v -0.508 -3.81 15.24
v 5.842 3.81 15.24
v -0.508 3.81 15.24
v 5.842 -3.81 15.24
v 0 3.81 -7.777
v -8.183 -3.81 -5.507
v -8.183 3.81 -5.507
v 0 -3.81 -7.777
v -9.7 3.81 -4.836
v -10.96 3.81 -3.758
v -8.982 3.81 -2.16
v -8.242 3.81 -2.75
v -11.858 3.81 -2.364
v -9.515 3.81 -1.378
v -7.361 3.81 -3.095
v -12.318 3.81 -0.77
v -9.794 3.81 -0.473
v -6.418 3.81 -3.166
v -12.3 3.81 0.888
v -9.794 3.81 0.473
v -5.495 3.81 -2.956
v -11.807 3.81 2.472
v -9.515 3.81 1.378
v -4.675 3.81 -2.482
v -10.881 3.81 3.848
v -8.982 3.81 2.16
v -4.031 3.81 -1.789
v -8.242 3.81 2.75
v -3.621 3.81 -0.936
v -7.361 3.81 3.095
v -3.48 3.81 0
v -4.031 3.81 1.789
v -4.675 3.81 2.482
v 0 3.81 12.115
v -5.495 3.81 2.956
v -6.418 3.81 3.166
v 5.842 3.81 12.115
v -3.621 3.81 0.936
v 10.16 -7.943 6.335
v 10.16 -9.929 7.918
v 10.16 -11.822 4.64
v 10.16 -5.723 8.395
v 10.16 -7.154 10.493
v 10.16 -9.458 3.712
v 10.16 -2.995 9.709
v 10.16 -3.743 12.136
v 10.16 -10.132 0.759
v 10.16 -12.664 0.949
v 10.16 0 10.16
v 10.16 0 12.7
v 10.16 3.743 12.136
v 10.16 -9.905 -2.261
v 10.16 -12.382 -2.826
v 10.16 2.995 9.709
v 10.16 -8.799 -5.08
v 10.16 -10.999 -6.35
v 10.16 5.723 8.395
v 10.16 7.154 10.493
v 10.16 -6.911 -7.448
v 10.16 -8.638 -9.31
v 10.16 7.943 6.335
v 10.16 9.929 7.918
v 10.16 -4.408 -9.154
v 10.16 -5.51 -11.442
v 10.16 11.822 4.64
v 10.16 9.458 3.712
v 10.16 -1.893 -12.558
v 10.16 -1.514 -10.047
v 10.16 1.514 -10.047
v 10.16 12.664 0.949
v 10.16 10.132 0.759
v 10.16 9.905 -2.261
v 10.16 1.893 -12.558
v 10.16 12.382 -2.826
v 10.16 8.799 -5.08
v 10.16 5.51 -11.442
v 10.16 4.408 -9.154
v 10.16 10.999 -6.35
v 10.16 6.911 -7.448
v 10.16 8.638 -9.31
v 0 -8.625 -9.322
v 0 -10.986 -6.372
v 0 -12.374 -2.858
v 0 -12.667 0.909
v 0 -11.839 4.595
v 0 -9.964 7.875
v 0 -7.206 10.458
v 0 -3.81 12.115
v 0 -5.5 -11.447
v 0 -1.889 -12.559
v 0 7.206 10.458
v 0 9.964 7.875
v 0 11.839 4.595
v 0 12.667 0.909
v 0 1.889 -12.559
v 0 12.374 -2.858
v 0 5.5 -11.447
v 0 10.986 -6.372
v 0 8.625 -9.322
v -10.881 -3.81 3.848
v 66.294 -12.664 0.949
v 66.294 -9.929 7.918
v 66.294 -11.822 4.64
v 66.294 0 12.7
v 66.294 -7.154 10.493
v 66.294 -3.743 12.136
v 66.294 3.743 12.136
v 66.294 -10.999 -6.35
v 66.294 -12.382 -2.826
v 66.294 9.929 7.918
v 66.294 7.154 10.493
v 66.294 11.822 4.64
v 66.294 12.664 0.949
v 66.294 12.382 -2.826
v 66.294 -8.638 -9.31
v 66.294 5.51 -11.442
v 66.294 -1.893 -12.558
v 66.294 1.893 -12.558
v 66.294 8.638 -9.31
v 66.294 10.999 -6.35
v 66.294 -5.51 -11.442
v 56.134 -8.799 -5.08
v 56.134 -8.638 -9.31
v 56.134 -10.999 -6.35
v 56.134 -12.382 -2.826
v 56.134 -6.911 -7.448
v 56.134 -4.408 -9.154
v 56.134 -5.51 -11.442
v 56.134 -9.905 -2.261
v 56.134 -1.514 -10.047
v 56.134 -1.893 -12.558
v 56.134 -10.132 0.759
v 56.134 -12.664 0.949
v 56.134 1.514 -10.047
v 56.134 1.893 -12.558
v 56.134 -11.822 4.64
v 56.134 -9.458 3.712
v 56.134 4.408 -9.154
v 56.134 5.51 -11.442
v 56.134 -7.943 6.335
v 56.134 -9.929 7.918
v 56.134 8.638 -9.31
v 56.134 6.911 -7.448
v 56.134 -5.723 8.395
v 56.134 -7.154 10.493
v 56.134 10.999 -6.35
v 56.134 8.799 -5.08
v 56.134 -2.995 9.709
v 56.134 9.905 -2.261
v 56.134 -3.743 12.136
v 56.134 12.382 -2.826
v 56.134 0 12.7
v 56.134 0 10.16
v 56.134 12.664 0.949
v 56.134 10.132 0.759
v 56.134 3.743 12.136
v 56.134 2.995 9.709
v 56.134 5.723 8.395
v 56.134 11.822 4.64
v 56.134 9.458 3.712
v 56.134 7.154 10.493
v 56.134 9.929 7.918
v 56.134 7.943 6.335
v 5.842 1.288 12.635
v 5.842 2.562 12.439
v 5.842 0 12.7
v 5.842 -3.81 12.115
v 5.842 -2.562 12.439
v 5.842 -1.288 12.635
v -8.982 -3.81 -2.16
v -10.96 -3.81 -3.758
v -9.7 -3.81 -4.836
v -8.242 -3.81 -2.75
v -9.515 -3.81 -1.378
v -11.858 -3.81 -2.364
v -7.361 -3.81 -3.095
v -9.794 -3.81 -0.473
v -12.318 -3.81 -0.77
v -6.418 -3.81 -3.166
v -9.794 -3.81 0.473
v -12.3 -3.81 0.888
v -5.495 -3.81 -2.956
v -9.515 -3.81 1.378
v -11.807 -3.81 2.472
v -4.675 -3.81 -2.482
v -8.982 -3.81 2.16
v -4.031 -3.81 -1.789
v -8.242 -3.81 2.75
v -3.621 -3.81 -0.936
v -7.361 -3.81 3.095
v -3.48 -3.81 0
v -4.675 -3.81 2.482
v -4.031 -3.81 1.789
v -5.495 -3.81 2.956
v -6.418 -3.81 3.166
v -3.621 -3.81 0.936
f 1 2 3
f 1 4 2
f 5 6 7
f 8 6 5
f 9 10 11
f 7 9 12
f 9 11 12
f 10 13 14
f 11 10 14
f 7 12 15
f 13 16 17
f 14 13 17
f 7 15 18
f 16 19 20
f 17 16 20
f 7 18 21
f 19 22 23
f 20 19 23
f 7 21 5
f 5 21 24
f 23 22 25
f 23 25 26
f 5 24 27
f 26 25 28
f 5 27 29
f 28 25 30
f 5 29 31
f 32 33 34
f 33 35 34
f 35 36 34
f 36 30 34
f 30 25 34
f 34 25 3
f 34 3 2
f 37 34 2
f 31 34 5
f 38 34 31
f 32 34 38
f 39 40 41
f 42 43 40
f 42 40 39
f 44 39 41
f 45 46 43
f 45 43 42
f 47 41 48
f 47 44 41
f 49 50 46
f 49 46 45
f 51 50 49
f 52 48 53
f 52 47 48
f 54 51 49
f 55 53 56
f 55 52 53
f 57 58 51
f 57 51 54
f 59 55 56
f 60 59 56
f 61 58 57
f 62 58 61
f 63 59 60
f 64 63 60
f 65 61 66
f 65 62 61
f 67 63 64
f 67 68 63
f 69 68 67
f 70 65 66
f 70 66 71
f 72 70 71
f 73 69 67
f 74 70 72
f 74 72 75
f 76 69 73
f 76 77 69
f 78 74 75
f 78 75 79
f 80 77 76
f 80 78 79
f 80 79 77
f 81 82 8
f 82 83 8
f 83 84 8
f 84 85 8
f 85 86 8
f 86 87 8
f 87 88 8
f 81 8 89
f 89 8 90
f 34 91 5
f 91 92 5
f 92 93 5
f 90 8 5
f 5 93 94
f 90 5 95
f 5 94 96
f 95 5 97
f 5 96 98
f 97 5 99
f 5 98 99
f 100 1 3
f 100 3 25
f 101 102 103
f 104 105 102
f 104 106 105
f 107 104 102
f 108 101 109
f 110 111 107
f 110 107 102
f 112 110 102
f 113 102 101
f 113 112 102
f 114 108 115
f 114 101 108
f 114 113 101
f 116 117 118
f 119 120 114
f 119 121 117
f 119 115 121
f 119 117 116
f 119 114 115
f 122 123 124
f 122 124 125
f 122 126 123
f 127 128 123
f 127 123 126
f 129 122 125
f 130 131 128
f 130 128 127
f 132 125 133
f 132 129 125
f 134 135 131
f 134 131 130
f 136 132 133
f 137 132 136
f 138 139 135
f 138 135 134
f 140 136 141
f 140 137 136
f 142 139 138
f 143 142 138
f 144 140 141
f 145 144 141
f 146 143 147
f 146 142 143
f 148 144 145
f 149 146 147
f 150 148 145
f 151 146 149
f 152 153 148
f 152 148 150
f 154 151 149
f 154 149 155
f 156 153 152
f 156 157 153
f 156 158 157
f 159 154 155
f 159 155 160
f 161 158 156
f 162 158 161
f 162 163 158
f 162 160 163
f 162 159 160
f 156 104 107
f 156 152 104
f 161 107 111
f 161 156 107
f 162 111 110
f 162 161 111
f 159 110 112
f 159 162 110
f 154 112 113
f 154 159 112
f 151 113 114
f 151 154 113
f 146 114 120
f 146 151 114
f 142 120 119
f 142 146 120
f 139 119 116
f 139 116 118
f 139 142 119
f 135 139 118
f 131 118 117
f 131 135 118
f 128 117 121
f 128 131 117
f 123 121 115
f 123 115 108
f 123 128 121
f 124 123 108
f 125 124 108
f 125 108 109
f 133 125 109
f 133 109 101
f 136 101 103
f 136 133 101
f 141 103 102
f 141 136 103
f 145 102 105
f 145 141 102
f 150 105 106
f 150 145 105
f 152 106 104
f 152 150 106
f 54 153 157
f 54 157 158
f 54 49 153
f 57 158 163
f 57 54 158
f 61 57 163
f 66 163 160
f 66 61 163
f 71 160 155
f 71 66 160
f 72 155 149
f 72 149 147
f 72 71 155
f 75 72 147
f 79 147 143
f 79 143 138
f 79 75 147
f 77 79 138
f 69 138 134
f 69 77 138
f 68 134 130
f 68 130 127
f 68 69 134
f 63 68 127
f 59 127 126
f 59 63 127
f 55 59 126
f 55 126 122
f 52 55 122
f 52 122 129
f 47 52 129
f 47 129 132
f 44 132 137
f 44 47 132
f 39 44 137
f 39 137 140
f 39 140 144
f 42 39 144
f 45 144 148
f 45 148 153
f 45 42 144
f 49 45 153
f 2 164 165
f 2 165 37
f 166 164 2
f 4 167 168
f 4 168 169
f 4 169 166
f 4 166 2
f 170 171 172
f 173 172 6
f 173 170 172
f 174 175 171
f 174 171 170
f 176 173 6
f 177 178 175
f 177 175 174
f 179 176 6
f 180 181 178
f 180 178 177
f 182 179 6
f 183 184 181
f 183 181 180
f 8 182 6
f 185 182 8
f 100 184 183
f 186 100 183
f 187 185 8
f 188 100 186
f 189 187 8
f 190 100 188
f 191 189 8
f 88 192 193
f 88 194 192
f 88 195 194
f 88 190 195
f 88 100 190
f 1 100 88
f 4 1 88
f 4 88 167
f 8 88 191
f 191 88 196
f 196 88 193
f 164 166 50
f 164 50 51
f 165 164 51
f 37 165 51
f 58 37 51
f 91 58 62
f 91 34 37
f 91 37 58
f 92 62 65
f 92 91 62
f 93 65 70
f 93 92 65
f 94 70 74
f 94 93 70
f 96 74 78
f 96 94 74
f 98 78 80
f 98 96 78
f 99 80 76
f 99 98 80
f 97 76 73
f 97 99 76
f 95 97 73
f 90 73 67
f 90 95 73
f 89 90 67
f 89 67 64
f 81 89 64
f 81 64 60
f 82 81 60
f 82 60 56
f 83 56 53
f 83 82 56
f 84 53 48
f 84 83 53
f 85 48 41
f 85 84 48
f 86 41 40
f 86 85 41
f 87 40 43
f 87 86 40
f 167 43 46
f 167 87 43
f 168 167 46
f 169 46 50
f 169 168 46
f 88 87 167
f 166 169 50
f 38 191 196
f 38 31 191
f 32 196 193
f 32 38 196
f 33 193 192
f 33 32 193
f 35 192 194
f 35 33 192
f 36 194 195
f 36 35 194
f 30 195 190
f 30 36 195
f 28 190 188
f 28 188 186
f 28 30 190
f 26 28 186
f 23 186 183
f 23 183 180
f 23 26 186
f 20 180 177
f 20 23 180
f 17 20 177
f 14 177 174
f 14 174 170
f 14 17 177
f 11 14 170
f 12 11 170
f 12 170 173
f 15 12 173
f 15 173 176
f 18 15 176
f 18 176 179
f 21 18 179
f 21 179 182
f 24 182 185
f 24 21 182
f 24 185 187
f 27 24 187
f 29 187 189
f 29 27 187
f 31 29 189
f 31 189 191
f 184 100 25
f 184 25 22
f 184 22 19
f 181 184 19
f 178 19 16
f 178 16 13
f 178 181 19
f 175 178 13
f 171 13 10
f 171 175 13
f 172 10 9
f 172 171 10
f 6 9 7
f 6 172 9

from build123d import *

# Parameters (mm, degrees)
F0_W     = 5.842
F0_H     = 12.7
F0_R     = 3.175
F2_DEPTH = 3.81


# Not quite as in the source:
# - a feature of the source that left no trace in its solid (it failed there, or was rolled back) is left out


with BuildPart() as f1:
    # F0 (on Front) → F1 (revolve)
    with BuildSketch(Plane.XZ):
        Polygon((5.842, 12.7), (5.842, 0), (66.294, 0), (66.294, 12.7), (56.134, 12.7), (56.134, 10.16), (10.16, 10.16), (10.16, 12.7), align=None)
        with Locations((2.921, 6.35)):
            Rectangle(F0_W, F0_H)
    revolve(axis=Axis((33.147, 0, 0), (-1, 0, 0)))

    # F0 (on Front) → F2 (join, symmetric)
    with BuildSketch(Plane.XZ):
        with BuildLine():
            Line((-0.9398, 0), (0, 0))
            Line((0, 0), (0, 12.7))
            Line((0, 12.7), (5.842, 12.7))
            Line((5.842, 12.7), (5.842, 15.24))
            Line((5.842, 15.24), (-0.508, 15.24))
            Line((-0.508, 15.24), (-10.8806298187, 3.8475430269))
            ThreePointArc((-10.8806298187, 3.8475430269), (-4.5919612295, 5.3297205562), (-0.9398, 0))
        make_face()
        with BuildLine():
            ThreePointArc((-8.1826630726, -5.5069827884), (-3.1957909266, -4.5493385486), (-0.9398, 0))
            ThreePointArc((-0.9398, 0), (-4.5919612295, 5.3297205562), (-10.8806298187, 3.8475430269))
            ThreePointArc((-10.8806298187, 3.8475430269), (-12.1459778134, -1.5837270034), (-8.1826630726, -5.5069827884))
        make_face()
        with Locations((-6.6548, 0)):
            Circle(F0_R, mode=Mode.SUBTRACT)
        with BuildLine():
            Line((0, -7.7771894014), (0, 0))
            Line((0, 0), (-0.9398, 0))
            ThreePointArc((-0.9398, 0), (-3.1957909266, -4.5493385486), (-8.1826630726, -5.5069827884))
            Line((-8.1826630726, -5.5069827884), (0, -7.7771894014))
        make_face()
        with Locations((2.921, 6.35)):
            Rectangle(F0_W, F0_H)
        Polygon((5.842, 0), (0, 0), (0, -7.7771894014), (5.842, -9.398), align=None)
    extrude(amount=F2_DEPTH, both=True)


solid = f1.part
